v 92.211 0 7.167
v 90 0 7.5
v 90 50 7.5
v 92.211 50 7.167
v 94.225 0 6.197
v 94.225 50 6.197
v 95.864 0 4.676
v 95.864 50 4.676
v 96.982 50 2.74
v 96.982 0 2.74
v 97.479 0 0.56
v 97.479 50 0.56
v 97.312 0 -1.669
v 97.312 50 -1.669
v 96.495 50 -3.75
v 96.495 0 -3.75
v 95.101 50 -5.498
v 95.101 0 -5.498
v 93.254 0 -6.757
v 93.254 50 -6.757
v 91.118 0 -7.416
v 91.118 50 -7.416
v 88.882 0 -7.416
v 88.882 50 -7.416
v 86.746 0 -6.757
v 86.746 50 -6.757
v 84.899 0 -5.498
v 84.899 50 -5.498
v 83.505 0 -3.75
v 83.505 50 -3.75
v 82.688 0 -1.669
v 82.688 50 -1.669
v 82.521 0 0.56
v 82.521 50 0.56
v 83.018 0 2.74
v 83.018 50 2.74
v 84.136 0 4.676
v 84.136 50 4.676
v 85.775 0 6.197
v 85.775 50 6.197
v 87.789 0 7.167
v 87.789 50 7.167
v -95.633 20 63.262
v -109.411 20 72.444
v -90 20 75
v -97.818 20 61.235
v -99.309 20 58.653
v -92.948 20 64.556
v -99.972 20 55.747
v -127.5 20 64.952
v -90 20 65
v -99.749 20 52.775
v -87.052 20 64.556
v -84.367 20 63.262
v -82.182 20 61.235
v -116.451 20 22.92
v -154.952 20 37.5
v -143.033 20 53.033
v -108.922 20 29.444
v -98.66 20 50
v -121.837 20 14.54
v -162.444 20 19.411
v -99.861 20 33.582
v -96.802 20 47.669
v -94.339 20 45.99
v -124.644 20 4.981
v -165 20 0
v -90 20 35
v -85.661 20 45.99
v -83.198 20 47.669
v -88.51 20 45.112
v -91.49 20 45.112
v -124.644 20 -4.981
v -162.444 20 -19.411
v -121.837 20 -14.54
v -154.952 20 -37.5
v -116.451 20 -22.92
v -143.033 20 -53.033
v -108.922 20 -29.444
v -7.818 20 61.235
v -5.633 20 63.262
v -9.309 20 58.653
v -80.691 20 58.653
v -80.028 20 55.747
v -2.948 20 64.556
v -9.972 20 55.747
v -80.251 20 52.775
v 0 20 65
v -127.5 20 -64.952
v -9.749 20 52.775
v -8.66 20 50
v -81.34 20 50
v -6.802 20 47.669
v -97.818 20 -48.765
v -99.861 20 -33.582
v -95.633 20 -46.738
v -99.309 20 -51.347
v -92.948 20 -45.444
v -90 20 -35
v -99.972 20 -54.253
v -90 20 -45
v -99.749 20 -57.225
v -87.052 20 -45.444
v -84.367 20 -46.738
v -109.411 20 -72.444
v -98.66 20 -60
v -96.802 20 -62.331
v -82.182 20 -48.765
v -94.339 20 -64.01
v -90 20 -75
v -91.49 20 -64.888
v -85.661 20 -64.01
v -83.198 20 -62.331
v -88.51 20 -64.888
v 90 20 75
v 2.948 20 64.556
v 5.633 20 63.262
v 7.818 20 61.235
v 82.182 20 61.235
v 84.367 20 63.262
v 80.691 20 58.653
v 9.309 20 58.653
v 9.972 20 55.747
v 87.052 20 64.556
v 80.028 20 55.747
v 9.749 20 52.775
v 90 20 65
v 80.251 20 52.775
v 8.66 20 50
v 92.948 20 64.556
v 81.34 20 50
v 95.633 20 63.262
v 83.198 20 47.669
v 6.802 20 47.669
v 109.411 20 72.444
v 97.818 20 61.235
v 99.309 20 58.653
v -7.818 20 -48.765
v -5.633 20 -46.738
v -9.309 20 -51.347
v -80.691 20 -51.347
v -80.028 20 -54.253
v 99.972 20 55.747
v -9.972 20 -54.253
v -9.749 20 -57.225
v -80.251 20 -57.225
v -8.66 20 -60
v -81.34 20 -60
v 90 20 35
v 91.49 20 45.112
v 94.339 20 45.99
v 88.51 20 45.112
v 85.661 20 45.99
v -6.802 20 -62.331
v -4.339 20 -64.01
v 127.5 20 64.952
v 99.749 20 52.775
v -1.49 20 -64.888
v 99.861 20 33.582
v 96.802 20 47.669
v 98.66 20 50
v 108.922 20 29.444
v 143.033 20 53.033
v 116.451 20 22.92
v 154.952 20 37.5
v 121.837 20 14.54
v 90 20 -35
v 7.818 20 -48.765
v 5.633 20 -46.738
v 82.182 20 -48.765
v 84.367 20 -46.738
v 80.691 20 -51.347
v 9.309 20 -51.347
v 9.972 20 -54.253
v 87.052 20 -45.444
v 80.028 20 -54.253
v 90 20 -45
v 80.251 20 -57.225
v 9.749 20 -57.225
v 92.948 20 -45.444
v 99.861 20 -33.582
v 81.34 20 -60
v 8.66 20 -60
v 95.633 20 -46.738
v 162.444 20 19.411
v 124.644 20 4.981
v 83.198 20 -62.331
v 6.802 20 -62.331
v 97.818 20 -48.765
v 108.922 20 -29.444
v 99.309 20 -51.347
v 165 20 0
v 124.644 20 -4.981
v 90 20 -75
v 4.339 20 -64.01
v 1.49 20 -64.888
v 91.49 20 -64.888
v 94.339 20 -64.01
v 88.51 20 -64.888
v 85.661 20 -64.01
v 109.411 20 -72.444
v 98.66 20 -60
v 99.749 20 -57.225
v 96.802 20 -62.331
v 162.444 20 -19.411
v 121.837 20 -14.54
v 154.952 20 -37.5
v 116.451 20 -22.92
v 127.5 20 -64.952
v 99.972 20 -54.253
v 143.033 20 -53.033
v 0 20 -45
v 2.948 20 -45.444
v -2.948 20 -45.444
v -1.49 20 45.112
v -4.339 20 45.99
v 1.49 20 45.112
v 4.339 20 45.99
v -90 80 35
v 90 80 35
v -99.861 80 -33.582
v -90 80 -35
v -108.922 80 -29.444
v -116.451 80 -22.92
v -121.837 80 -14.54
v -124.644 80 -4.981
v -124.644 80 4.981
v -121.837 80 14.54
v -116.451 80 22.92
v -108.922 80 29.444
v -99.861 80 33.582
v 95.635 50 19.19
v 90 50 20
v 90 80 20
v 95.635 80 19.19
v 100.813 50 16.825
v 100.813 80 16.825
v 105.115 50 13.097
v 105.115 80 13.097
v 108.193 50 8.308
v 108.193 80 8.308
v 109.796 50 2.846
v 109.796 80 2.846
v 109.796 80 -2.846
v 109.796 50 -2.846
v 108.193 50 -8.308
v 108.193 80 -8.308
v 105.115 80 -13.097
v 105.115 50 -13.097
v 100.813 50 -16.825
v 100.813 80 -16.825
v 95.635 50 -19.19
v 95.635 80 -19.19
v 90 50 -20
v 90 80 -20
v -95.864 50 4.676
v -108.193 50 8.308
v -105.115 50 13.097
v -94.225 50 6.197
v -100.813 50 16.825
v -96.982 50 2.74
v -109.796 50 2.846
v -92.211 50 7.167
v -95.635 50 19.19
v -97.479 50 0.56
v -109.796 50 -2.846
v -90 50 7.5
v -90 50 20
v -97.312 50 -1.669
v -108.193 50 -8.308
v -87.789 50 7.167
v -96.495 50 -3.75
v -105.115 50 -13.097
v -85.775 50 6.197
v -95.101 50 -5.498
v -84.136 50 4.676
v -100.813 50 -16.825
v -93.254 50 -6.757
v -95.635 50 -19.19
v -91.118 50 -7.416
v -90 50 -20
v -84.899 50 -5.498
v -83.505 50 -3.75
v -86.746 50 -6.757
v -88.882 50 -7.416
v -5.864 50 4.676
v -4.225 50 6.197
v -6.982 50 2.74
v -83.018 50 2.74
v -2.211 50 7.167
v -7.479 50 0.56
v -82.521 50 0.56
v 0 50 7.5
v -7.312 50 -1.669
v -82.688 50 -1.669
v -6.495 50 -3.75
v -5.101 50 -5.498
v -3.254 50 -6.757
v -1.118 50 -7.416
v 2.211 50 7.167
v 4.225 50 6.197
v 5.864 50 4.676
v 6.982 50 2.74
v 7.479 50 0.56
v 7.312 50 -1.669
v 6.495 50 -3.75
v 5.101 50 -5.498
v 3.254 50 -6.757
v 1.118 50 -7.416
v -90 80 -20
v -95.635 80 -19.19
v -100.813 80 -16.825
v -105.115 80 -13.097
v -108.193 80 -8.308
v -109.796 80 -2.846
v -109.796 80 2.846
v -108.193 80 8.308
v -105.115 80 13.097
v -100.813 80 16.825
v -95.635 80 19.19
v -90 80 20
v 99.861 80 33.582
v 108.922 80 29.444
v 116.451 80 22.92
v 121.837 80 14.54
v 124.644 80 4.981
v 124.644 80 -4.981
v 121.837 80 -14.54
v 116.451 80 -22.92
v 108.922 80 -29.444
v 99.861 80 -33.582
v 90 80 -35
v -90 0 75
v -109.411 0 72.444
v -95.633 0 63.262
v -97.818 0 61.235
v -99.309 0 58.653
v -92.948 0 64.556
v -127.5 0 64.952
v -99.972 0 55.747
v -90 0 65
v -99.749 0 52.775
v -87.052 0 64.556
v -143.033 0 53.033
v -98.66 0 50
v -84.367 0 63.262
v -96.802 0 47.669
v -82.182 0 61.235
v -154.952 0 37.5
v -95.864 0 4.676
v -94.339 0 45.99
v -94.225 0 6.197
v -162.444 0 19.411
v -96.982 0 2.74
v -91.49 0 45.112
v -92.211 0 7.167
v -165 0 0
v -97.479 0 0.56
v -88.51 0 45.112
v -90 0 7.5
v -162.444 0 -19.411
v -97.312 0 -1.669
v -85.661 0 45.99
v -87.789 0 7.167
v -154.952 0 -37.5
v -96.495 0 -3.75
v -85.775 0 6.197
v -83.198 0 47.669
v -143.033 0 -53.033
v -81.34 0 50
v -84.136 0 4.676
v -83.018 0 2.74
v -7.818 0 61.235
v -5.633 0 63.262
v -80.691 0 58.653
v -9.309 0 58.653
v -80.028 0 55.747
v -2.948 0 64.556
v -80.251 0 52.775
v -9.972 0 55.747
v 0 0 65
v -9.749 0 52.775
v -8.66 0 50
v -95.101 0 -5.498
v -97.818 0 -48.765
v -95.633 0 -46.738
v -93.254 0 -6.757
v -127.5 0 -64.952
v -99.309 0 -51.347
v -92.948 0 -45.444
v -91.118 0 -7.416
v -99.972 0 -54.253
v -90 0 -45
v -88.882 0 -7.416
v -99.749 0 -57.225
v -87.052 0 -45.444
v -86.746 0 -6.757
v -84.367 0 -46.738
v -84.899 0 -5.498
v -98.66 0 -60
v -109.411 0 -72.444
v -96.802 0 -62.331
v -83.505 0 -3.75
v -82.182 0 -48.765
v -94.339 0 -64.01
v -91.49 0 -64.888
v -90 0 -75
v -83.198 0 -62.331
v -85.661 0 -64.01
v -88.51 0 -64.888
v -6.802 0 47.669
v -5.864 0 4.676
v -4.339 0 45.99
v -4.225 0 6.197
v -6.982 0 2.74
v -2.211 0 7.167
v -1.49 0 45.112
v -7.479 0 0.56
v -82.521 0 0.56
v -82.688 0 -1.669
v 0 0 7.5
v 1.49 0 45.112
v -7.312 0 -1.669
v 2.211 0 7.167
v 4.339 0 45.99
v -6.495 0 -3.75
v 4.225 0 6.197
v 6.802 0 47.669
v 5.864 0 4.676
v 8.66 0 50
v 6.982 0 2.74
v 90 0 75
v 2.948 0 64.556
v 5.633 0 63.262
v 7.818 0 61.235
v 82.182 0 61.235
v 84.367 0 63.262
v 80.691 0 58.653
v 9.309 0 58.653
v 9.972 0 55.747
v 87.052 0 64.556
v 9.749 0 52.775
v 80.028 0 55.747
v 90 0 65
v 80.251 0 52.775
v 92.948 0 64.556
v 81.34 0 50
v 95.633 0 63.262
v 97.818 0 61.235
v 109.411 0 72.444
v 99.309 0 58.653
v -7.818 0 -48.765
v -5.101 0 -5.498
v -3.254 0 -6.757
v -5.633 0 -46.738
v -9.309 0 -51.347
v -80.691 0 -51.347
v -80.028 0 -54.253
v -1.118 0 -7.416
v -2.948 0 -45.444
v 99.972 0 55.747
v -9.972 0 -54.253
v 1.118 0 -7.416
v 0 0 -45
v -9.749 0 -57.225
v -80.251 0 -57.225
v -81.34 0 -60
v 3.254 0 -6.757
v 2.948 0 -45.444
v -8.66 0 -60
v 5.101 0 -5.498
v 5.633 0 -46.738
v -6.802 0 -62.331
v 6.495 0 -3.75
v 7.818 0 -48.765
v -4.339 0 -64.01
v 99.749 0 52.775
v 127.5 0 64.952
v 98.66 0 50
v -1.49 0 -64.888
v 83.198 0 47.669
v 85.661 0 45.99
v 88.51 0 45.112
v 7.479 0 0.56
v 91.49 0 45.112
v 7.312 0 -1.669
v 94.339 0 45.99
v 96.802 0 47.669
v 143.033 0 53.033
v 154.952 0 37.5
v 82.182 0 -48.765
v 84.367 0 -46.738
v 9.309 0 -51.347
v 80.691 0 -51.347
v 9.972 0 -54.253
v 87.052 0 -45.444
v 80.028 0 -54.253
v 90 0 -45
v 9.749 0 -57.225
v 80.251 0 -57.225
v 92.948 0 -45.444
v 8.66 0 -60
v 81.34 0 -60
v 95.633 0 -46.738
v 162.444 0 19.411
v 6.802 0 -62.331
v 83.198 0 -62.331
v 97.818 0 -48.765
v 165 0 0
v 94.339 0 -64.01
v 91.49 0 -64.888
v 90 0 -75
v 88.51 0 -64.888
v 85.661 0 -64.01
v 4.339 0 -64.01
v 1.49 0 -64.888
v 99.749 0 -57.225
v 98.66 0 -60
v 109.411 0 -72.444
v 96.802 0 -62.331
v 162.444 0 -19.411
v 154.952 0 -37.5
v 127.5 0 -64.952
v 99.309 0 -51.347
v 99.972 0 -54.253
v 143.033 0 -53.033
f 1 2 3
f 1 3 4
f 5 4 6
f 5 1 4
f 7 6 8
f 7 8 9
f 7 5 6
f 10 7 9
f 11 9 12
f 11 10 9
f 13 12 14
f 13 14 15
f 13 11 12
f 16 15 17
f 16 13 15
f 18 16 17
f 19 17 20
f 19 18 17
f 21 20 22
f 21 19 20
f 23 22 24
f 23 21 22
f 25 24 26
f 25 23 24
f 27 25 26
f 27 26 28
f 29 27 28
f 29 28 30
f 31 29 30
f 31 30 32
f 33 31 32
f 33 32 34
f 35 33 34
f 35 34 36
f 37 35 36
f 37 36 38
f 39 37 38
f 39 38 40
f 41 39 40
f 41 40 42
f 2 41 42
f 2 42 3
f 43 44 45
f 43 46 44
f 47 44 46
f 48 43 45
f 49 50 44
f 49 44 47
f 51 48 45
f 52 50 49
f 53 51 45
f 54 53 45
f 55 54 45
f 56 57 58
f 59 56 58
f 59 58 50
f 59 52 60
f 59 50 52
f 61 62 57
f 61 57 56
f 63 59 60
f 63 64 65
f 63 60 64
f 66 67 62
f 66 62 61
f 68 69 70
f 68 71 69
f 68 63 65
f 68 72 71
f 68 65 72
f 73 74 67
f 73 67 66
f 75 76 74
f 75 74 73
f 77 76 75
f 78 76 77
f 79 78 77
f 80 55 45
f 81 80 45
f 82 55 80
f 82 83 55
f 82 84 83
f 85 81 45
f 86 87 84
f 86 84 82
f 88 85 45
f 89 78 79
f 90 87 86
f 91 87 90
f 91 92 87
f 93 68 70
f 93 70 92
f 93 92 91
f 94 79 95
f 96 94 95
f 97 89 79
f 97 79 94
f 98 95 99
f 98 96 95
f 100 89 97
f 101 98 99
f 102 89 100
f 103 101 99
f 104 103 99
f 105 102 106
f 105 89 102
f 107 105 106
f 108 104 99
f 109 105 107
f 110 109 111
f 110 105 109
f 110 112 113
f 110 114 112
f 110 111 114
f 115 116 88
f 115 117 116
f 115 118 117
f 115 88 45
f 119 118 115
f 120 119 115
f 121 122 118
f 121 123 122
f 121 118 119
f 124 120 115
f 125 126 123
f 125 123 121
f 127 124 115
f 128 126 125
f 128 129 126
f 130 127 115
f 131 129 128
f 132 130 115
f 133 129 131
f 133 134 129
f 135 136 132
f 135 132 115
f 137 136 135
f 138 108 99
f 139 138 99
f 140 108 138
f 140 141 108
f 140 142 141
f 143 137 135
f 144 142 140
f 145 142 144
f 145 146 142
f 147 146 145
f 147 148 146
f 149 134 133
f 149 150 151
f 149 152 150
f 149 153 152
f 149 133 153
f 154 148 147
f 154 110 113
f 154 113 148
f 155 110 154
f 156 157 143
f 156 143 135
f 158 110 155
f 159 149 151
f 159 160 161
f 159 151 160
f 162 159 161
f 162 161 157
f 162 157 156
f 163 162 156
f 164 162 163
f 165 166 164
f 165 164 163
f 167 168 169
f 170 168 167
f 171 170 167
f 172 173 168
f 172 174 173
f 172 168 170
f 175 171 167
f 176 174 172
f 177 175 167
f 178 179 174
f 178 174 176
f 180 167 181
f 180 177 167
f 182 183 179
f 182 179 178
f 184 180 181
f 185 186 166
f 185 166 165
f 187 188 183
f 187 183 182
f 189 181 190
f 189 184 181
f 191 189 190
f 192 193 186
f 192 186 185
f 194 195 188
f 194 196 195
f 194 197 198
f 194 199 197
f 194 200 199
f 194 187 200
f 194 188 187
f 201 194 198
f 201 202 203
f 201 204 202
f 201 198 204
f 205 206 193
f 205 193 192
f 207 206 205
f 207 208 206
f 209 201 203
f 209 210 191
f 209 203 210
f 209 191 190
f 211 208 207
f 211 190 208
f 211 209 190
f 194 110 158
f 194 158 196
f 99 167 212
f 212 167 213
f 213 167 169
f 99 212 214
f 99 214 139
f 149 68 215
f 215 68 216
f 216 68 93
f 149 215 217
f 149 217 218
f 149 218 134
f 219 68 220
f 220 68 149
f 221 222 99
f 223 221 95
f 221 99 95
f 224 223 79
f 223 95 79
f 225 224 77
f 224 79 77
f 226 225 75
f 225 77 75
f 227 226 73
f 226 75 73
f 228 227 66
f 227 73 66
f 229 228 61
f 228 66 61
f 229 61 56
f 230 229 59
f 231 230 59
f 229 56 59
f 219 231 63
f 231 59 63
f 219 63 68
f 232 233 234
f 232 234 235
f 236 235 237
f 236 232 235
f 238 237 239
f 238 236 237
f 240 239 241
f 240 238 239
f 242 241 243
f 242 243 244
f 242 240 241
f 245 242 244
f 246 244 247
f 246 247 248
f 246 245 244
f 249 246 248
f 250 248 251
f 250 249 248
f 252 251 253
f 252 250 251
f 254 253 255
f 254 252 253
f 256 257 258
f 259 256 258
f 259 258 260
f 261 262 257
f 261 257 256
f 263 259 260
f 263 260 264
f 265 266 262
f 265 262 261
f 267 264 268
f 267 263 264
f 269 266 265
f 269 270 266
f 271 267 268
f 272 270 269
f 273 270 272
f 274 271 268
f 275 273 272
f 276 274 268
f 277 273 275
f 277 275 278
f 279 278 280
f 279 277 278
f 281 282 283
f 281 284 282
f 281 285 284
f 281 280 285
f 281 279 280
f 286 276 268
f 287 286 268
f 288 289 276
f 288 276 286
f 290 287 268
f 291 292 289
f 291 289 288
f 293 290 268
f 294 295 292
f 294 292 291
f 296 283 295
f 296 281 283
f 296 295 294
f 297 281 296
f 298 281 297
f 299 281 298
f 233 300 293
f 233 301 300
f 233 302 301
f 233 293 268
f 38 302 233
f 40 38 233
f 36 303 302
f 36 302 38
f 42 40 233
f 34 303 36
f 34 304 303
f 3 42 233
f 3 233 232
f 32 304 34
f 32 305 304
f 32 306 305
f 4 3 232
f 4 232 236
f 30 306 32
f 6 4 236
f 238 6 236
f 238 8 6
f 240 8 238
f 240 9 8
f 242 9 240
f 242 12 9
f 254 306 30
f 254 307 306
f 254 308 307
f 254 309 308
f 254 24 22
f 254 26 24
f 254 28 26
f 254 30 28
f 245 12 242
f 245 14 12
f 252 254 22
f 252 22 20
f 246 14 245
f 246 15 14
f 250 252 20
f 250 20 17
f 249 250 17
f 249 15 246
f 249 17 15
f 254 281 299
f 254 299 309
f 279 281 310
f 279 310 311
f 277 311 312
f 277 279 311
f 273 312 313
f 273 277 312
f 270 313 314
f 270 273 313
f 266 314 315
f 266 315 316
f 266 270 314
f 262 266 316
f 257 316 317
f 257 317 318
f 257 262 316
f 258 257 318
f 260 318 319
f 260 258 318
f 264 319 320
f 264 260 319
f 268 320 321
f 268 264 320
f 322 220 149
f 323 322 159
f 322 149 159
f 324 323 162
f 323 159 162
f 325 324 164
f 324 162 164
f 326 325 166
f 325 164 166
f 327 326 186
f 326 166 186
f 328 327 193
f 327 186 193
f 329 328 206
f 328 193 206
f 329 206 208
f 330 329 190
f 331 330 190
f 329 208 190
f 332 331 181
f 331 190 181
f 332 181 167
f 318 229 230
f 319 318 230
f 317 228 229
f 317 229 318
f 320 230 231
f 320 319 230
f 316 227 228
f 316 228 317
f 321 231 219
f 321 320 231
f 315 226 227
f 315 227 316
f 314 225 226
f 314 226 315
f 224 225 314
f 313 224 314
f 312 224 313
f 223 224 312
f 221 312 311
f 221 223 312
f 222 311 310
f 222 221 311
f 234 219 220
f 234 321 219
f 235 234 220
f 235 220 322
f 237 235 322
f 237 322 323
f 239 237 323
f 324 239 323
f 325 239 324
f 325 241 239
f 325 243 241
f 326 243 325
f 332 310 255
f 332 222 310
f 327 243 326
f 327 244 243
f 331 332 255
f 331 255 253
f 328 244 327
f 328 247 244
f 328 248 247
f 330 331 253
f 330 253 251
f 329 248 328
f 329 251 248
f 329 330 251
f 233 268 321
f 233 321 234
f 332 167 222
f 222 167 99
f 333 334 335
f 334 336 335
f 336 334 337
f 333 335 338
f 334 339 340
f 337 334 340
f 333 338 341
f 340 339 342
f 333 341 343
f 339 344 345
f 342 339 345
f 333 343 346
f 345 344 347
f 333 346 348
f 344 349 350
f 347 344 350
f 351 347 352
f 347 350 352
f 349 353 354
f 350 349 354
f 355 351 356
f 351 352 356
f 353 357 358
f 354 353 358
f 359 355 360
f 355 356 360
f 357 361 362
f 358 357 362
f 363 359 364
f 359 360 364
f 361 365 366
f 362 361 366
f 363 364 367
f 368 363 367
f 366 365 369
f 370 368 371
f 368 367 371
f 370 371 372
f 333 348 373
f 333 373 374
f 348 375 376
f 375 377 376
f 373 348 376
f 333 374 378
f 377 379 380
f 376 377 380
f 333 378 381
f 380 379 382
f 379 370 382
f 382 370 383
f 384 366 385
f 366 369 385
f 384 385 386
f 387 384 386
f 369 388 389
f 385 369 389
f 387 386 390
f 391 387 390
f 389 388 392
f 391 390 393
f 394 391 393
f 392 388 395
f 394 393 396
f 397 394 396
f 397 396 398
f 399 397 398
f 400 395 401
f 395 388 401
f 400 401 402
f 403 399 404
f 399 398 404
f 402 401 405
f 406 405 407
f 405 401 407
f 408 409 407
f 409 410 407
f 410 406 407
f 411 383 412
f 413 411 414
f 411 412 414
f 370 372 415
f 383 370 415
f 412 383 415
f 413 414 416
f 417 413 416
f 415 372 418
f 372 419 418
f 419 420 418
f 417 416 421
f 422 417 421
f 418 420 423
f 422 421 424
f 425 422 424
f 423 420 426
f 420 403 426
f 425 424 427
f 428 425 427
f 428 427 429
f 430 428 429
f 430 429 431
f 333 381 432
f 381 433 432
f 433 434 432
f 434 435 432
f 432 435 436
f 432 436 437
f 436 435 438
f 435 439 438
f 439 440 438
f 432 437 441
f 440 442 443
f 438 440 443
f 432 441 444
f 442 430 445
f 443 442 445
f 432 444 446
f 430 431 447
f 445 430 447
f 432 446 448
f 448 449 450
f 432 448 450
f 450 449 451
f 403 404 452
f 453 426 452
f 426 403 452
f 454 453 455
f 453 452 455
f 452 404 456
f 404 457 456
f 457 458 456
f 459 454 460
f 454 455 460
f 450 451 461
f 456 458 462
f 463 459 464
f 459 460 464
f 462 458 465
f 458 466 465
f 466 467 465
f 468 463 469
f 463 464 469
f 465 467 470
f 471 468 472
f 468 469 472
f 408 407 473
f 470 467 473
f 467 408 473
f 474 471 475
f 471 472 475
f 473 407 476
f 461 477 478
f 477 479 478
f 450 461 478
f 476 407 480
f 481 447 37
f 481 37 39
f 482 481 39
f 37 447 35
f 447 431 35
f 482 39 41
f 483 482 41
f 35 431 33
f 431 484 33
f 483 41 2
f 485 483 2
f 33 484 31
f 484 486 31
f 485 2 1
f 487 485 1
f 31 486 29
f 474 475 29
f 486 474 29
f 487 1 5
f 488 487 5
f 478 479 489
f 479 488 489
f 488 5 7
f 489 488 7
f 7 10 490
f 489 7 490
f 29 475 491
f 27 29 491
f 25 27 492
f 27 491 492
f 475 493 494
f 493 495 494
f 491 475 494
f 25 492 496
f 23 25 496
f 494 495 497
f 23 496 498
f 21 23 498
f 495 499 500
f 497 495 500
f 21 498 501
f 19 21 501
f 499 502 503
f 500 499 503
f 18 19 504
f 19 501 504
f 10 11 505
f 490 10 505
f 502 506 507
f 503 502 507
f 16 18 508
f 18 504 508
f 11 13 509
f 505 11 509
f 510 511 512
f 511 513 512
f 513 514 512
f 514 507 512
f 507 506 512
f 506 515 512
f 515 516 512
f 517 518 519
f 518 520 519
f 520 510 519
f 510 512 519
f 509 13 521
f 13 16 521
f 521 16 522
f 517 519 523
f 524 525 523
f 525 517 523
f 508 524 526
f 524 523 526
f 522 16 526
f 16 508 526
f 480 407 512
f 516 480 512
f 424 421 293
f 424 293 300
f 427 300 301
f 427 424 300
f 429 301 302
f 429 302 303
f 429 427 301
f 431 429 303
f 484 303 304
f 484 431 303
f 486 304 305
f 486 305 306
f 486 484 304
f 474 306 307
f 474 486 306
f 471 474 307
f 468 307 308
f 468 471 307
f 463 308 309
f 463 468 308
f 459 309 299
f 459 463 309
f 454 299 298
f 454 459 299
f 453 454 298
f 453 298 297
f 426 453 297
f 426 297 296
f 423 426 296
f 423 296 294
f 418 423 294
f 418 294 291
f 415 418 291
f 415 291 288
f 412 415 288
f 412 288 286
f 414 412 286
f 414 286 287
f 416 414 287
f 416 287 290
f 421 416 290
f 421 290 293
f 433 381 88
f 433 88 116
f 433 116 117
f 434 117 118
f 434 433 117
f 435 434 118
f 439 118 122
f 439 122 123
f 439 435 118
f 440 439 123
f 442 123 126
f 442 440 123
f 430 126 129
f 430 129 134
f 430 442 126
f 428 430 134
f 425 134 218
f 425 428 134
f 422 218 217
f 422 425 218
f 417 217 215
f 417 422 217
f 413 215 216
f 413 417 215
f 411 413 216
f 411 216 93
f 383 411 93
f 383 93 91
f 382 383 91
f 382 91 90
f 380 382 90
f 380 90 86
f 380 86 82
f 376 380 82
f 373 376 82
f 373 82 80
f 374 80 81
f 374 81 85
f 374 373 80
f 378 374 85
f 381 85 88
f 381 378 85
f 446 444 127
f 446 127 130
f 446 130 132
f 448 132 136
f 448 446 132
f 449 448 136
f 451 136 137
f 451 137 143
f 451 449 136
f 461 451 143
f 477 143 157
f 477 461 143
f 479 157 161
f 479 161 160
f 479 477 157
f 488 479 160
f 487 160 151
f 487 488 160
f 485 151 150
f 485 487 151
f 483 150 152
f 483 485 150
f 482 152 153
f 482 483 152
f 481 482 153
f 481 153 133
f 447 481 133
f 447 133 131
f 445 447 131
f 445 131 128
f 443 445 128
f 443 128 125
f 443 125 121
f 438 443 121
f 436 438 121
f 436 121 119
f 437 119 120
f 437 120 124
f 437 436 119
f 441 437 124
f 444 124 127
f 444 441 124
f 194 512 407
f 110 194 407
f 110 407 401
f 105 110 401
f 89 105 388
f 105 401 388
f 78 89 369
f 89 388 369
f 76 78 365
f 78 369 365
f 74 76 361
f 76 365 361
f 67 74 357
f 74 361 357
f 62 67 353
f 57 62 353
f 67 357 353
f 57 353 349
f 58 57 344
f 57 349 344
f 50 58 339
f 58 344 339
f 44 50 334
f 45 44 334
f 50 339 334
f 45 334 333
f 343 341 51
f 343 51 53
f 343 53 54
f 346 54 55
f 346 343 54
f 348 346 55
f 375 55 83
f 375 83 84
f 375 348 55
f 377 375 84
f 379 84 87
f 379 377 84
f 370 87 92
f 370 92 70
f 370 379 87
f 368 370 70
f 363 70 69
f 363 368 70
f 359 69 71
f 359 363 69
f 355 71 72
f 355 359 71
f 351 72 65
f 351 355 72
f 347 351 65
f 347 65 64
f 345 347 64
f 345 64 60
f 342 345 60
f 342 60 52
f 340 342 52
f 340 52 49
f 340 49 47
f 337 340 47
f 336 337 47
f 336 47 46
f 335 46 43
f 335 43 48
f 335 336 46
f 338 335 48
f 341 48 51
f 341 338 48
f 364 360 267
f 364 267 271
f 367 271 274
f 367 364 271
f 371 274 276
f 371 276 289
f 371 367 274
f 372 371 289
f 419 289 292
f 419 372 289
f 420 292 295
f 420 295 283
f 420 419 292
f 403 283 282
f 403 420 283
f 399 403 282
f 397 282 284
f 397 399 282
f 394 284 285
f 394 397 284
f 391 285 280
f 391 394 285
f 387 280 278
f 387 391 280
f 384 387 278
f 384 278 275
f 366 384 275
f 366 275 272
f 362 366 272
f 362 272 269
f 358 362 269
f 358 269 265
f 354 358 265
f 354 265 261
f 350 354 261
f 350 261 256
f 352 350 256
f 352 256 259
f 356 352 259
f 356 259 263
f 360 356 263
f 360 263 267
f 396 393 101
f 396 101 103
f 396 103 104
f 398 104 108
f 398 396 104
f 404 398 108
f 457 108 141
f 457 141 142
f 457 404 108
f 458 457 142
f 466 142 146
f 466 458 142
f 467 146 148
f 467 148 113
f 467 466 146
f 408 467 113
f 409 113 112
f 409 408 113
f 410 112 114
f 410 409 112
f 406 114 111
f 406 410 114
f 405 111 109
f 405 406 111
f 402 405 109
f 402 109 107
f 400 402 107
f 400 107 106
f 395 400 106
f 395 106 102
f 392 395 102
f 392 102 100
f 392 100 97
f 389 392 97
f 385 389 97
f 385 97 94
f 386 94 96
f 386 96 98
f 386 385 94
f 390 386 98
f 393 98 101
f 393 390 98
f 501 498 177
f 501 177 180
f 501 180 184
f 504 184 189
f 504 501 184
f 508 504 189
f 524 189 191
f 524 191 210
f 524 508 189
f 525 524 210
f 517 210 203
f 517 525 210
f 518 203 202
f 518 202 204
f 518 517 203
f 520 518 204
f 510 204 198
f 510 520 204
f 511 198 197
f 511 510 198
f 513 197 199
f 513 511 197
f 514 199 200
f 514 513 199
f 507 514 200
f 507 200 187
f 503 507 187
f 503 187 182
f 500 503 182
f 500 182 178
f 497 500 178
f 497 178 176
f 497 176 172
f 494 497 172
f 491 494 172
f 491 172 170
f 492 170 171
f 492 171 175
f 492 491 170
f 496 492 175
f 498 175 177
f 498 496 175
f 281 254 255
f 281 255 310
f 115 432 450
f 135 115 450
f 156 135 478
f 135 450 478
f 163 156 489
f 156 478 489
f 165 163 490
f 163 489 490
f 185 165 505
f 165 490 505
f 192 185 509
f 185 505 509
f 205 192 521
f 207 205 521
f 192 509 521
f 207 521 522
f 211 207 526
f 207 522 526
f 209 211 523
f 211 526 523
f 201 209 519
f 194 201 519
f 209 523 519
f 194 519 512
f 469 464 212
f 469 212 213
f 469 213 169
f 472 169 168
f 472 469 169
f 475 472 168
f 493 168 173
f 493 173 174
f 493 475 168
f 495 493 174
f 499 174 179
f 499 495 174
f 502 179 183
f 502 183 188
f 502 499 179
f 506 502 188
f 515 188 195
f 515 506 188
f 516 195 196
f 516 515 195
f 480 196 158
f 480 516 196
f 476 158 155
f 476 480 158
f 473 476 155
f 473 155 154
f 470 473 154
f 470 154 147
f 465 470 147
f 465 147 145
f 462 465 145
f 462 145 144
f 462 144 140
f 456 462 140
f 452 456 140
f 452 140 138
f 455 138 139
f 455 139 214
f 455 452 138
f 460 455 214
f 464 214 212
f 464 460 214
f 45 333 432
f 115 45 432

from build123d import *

# Parameters (mm, degrees)
SKETCH1_R           = 10
SKETCH1_R_2         = 7.5
BOSS_EXTRUDE1_DEPTH = 20
SKETCH1_4_R         = 7.5
BOSS_EXTRUDE2_DEPTH = 50
BOSS_EXTRUDE3_DEPTH = 80


with BuildPart() as part:
    # Sketch1 → Boss-Extrude1 (new body)
    with BuildSketch(Plane(origin=(0, 0, 0), x_dir=(1, 0, 0), z_dir=(0, 1, 0))):
        with BuildLine():
            Line((-90, -75), (90, -75))
            ThreePointArc((90, -75), (165, 0), (90, 75))
            Line((90, 75), (-90, 75))
            ThreePointArc((-90, 75), (-165, 0), (-90, -75))
        make_face()
        with Locations((-90, -55)):
            Circle(SKETCH1_R, mode=Mode.SUBTRACT)
        with Locations((0, -55)):
            Circle(SKETCH1_R, mode=Mode.SUBTRACT)
        with Locations((90, -55)):
            Circle(SKETCH1_R, mode=Mode.SUBTRACT)
        with Locations((-90, 55)):
            Circle(SKETCH1_R, mode=Mode.SUBTRACT)
        with Locations((0, 55)):
            Circle(SKETCH1_R, mode=Mode.SUBTRACT)
        with Locations((90, 55)):
            Circle(SKETCH1_R, mode=Mode.SUBTRACT)
        with Locations((90, 0)):
            Circle(SKETCH1_R_2, mode=Mode.SUBTRACT)
        with Locations((-90, 0)):
            Circle(SKETCH1_R_2, mode=Mode.SUBTRACT)
        Circle(SKETCH1_R_2, mode=Mode.SUBTRACT)
    extrude(amount=BOSS_EXTRUDE1_DEPTH)

    # Sketch1<4> → Boss-Extrude2 (add)
    with BuildSketch(Plane(origin=(0, 0, 0), x_dir=(1, 0, 0), z_dir=(0, 1, 0))):
        with BuildLine():
            Line((-90, -20), (90, -20))
            ThreePointArc((90, -20), (110, 0), (90, 20))
            Line((90, 20), (-90, 20))
            ThreePointArc((-90, 20), (-110, 0), (-90, -20))
        make_face()
        with Locations((-90, 0)):
            Circle(SKETCH1_4_R, mode=Mode.SUBTRACT)
        Circle(SKETCH1_4_R, mode=Mode.SUBTRACT)
        with Locations((90, 0)):
            Circle(SKETCH1_4_R, mode=Mode.SUBTRACT)
    extrude(amount=BOSS_EXTRUDE2_DEPTH)

    # Sketch1<5> → Boss-Extrude3 (add)
    with BuildSketch(Plane(origin=(0, 0, 0), x_dir=(1, 0, 0), z_dir=(0, 1, 0))):
        with BuildLine():
            Line((-90, -35), (90, -35))
            ThreePointArc((90, -35), (125, 0), (90, 35))
            Line((90, 35), (-90, 35))
            ThreePointArc((-90, 35), (-125, 0), (-90, -35))
        make_face()
        with BuildLine():
            ThreePointArc((90, 20), (110, 0), (90, -20))
            Line((90, -20), (-90, -20))
            ThreePointArc((-90, -20), (-110, 0), (-90, 20))
            Line((-90, 20), (90, 20))
        make_face(mode=Mode.SUBTRACT)
    extrude(amount=BOSS_EXTRUDE3_DEPTH)


solid = part.part
